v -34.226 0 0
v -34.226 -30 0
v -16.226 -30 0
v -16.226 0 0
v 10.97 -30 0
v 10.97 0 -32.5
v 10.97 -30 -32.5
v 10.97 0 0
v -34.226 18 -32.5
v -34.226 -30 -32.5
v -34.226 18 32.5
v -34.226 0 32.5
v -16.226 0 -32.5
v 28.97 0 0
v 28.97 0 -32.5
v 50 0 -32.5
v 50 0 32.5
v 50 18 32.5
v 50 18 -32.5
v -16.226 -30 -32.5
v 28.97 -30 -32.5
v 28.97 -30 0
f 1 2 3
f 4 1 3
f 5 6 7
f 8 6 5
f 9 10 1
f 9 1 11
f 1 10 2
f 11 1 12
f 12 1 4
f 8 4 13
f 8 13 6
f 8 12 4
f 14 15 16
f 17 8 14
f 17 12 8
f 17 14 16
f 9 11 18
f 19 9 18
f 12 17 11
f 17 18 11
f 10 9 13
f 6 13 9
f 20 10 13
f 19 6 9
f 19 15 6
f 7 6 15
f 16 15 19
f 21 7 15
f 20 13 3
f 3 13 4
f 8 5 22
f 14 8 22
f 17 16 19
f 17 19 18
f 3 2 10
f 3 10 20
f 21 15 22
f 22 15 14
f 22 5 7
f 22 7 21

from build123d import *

# Parameters (mm, degrees)
F0_W     = 100
F0_H     = 65
F1_DEPTH = 18
F2_W     = 18
F2_H     = 32.5
F3_DEPTH = 30
F4_DEPTH = 30
F6_DEPTH = 25
F7_DEPTH = 43


with BuildPart() as f1:
    # F0 (on Front) → F1 (new body)
    with BuildSketch(Plane.XZ):
        Rectangle(F0_W, F0_H)
    extrude(amount=-F1_DEPTH)

    # F2 (on face) → F3 (join)
    with BuildSketch(Plane.XZ):
        with Locations((-25.2264994979, -16.25)):
            Rectangle(F2_W, F2_H)
    extrude(amount=F3_DEPTH)

    # F2 (on face) → F4 (join)
    with BuildSketch(Plane.XZ):
        with Locations((19.9700337052, -16.25)):
            Rectangle(F2_W, F2_H)
    extrude(amount=F4_DEPTH)

    # F5 (on face) → F6 (join)
    with BuildSketch(Plane.XZ):
        Polygon((-34.2264994979, -32.5), (-34.2264994979, -32.4203260243), (-34.2264994979, 0), (-34.2264994979, 32.5), (-50, 32.5), (-50, -32.5), align=None)
    extrude(amount=F6_DEPTH)

    # F7 (cut): a face of the model
    f7_faces = [f1.faces().sort_by_distance(p)[0] for p in [
        (-42.1132497489, -25, 0),
    ]]
    extrude(f7_faces, amount=-F7_DEPTH, mode=Mode.SUBTRACT)


solid = f1.part
